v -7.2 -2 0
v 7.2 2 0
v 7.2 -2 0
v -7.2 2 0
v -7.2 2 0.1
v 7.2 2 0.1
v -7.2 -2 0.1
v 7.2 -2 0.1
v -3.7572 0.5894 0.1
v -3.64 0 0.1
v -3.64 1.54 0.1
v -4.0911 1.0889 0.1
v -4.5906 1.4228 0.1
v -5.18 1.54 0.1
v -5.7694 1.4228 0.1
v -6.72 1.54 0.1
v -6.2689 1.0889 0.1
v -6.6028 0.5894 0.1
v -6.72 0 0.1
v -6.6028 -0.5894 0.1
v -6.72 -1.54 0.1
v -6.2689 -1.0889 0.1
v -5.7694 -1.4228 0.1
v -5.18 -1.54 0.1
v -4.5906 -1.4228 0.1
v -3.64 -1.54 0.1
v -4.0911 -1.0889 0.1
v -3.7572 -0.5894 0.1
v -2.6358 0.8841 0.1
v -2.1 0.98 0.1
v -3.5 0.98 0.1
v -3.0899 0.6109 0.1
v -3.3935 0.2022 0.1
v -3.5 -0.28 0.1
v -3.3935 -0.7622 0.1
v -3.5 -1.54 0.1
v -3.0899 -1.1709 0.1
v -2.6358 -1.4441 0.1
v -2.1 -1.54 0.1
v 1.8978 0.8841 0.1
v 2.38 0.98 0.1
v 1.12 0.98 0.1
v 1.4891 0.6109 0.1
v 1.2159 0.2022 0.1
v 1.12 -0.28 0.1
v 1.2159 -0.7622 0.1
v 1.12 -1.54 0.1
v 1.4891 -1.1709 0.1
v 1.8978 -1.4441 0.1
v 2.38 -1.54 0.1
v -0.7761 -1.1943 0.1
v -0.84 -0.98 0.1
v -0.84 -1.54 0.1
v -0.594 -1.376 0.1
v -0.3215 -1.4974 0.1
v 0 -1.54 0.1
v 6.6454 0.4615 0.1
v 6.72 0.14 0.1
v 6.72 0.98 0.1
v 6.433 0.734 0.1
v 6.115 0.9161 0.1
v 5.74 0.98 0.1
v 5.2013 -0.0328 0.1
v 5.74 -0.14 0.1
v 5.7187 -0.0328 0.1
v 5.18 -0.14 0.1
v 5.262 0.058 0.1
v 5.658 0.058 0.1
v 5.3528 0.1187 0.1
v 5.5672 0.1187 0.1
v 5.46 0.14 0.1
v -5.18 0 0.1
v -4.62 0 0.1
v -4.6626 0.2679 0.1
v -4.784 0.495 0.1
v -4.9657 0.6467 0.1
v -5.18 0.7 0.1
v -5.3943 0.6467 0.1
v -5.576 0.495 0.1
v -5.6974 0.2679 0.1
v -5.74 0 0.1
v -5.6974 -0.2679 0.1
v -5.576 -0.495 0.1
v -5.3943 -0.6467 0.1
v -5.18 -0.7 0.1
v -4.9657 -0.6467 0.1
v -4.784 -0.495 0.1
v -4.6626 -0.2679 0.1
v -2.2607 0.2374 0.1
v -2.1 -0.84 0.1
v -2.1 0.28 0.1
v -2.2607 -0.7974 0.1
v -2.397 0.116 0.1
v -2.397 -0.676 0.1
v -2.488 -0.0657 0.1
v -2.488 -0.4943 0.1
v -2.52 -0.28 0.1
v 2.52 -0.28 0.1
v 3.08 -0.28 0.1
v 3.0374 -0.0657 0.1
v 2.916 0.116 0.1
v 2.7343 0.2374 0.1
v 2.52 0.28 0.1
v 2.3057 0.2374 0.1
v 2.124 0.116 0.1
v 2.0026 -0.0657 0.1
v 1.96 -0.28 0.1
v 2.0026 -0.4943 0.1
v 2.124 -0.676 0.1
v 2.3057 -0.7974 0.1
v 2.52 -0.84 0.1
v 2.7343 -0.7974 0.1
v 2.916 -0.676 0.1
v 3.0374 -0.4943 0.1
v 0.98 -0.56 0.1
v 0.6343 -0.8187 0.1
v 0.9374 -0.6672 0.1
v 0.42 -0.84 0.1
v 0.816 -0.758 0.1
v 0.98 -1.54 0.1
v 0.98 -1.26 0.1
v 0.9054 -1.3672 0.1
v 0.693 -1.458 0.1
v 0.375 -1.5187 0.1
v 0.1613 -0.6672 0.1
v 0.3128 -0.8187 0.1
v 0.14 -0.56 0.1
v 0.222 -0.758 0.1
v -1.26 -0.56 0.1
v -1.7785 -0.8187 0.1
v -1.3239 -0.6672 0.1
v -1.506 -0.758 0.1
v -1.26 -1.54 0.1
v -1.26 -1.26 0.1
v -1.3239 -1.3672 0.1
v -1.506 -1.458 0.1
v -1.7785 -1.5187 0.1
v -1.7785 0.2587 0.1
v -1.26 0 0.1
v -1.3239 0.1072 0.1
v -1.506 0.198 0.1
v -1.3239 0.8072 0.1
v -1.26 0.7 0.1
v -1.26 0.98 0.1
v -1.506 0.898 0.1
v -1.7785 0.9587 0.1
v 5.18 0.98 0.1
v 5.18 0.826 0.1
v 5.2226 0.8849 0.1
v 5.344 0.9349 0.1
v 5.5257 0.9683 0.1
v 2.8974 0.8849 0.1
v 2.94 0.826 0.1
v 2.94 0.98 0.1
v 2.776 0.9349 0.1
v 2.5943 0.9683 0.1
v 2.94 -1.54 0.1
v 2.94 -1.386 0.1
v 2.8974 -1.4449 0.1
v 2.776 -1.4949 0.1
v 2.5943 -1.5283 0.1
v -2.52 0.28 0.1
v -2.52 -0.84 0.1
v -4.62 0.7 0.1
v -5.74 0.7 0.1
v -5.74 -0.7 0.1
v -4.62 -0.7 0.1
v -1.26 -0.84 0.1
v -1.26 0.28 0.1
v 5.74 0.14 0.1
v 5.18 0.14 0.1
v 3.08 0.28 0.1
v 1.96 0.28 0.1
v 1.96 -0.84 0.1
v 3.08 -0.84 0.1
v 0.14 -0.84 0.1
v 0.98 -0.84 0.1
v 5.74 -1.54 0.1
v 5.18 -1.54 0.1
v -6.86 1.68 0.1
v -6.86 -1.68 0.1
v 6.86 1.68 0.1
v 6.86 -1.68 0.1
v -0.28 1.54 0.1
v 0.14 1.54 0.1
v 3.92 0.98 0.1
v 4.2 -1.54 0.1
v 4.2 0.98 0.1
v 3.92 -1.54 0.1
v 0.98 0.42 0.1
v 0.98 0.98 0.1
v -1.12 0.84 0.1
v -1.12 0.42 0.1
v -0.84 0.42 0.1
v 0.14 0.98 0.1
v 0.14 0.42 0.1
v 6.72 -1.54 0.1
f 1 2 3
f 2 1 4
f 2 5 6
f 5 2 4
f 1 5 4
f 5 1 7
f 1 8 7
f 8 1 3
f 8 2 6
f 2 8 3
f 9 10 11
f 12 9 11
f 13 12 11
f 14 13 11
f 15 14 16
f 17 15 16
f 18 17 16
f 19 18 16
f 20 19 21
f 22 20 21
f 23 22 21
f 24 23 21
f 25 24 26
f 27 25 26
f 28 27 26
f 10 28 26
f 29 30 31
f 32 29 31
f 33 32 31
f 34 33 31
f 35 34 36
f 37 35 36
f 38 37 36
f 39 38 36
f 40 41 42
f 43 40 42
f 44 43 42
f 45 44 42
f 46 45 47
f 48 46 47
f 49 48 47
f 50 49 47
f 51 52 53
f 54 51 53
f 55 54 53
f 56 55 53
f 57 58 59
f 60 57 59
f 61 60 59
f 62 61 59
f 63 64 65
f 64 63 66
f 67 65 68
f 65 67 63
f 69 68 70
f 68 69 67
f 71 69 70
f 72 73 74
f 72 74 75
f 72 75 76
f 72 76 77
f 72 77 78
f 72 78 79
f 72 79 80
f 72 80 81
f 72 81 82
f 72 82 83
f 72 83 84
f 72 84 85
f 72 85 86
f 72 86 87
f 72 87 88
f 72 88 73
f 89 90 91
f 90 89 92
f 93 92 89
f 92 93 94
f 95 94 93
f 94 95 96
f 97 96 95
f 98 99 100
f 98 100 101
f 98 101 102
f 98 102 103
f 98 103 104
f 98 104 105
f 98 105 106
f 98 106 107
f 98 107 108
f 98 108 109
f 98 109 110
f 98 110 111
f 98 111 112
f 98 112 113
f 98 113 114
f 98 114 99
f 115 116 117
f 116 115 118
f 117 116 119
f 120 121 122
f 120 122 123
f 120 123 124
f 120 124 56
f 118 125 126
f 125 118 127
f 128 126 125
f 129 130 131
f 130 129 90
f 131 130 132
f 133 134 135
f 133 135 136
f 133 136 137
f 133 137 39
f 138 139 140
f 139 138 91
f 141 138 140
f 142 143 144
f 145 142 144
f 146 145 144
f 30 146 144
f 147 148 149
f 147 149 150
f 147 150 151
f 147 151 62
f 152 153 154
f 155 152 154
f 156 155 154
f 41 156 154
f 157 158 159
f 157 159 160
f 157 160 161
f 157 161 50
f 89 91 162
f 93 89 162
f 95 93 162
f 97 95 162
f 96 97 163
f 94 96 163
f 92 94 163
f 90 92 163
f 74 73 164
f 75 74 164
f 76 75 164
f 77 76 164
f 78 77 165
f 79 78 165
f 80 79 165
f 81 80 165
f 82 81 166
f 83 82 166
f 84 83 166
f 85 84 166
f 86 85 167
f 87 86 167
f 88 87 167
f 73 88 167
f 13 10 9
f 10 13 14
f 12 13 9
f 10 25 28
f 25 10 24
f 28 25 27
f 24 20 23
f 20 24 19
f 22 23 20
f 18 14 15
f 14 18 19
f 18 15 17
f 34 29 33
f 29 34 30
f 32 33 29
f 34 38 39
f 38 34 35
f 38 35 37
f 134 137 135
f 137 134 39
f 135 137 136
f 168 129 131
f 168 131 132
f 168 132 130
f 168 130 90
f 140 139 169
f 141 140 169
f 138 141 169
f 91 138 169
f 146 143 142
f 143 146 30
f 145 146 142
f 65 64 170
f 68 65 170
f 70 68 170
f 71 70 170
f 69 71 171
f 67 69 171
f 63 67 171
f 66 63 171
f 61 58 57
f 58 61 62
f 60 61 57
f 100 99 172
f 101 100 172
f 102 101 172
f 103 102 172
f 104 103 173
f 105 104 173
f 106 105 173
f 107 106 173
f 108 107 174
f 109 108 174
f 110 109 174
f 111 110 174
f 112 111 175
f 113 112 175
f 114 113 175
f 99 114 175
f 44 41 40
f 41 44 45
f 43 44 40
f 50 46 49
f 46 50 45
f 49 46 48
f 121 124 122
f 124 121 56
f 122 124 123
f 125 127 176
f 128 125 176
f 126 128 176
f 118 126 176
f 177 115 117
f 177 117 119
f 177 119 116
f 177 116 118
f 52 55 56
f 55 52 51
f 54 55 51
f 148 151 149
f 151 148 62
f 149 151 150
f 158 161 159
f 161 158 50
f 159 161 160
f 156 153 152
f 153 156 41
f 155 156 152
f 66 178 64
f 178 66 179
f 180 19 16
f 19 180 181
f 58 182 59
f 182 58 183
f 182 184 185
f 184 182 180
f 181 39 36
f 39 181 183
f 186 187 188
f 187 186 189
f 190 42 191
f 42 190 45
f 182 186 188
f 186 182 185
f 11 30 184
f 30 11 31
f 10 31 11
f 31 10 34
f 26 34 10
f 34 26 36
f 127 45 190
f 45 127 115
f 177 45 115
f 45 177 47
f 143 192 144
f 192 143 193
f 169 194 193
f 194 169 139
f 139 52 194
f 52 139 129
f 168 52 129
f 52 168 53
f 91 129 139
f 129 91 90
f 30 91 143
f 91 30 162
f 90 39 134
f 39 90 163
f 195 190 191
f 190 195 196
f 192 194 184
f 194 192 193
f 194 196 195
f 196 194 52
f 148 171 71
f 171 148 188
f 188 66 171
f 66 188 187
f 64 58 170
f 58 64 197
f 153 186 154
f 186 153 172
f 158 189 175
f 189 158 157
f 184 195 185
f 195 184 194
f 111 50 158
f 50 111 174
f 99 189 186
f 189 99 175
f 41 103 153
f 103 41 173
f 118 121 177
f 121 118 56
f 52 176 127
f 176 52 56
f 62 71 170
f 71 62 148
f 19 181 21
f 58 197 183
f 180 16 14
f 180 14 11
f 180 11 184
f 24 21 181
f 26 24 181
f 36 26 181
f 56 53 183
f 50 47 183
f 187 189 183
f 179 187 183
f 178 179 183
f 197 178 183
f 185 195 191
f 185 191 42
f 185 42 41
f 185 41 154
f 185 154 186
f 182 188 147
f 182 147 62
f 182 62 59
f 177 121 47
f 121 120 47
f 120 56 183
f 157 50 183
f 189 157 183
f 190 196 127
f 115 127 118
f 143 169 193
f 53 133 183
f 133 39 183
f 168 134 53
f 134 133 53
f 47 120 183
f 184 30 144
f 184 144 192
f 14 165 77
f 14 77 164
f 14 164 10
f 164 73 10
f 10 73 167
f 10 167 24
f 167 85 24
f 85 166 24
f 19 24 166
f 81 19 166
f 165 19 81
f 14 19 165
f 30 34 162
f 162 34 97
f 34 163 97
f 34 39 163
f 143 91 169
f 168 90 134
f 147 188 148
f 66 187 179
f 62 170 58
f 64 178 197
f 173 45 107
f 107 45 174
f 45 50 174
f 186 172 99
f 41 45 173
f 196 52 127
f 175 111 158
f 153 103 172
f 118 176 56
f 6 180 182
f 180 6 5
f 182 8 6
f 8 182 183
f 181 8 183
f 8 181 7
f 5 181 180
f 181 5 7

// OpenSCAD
use <../lib.scad>
use <165495c.scad>
$fa=1; $fs=0.2;
function ldraw_lib__165395e(realsolid=false) = [
// 0 =Sticker  0.5 x  1.8 with Octan Logo without Border on Transparent Background
// 0 Name: 165395e.dat
// 0 Author: Takeshi Takahashi [RainbowDolphin]
// 0 !LDRAW_ORG Part Alias UPDATE 2022-05
// 0 !LICENSE Licensed under CC BY 2.0 and CC BY 4.0 : see CAreadme.txt
// 
// 0 BFC CERTIFY CCW
  [0,"BFC","CERTIFY"],
  [0,"BFC","CCW"],
// 
// 0 !KEYWORDS Bricklink 6551stk01, Brickowl 930700, Fuel, Gas, oil, Raceway
// 0 !KEYWORDS Rebrickable 165395, Set 6551
// 
// 0 !HISTORY 2022-09-15 [PTadmin] Official Update 2022-05
// 
// 
// 0 // Alias of 165495c, but used as a formed sticker applied on 3941 cylindrical face in actual set
// 
// 1 16 0 0 0 1 0 0 0 1 0 0 0 1 165495c.dat
  [1,16,0,0,0,1,0,0,0,1,0,0,0,1, ldraw_lib__165495c(realsolid)],
];
module ldraw_lib__165395e(step=0, col=false, unit=2/5, alt=false, line=0.2, solid=!$preview)
    makepoly(ldraw_lib__165395e(solid), step=step, col=col, unit=unit, alt=alt, line=line, solid=solid);
ldraw_lib__165395e(line=0.2);
